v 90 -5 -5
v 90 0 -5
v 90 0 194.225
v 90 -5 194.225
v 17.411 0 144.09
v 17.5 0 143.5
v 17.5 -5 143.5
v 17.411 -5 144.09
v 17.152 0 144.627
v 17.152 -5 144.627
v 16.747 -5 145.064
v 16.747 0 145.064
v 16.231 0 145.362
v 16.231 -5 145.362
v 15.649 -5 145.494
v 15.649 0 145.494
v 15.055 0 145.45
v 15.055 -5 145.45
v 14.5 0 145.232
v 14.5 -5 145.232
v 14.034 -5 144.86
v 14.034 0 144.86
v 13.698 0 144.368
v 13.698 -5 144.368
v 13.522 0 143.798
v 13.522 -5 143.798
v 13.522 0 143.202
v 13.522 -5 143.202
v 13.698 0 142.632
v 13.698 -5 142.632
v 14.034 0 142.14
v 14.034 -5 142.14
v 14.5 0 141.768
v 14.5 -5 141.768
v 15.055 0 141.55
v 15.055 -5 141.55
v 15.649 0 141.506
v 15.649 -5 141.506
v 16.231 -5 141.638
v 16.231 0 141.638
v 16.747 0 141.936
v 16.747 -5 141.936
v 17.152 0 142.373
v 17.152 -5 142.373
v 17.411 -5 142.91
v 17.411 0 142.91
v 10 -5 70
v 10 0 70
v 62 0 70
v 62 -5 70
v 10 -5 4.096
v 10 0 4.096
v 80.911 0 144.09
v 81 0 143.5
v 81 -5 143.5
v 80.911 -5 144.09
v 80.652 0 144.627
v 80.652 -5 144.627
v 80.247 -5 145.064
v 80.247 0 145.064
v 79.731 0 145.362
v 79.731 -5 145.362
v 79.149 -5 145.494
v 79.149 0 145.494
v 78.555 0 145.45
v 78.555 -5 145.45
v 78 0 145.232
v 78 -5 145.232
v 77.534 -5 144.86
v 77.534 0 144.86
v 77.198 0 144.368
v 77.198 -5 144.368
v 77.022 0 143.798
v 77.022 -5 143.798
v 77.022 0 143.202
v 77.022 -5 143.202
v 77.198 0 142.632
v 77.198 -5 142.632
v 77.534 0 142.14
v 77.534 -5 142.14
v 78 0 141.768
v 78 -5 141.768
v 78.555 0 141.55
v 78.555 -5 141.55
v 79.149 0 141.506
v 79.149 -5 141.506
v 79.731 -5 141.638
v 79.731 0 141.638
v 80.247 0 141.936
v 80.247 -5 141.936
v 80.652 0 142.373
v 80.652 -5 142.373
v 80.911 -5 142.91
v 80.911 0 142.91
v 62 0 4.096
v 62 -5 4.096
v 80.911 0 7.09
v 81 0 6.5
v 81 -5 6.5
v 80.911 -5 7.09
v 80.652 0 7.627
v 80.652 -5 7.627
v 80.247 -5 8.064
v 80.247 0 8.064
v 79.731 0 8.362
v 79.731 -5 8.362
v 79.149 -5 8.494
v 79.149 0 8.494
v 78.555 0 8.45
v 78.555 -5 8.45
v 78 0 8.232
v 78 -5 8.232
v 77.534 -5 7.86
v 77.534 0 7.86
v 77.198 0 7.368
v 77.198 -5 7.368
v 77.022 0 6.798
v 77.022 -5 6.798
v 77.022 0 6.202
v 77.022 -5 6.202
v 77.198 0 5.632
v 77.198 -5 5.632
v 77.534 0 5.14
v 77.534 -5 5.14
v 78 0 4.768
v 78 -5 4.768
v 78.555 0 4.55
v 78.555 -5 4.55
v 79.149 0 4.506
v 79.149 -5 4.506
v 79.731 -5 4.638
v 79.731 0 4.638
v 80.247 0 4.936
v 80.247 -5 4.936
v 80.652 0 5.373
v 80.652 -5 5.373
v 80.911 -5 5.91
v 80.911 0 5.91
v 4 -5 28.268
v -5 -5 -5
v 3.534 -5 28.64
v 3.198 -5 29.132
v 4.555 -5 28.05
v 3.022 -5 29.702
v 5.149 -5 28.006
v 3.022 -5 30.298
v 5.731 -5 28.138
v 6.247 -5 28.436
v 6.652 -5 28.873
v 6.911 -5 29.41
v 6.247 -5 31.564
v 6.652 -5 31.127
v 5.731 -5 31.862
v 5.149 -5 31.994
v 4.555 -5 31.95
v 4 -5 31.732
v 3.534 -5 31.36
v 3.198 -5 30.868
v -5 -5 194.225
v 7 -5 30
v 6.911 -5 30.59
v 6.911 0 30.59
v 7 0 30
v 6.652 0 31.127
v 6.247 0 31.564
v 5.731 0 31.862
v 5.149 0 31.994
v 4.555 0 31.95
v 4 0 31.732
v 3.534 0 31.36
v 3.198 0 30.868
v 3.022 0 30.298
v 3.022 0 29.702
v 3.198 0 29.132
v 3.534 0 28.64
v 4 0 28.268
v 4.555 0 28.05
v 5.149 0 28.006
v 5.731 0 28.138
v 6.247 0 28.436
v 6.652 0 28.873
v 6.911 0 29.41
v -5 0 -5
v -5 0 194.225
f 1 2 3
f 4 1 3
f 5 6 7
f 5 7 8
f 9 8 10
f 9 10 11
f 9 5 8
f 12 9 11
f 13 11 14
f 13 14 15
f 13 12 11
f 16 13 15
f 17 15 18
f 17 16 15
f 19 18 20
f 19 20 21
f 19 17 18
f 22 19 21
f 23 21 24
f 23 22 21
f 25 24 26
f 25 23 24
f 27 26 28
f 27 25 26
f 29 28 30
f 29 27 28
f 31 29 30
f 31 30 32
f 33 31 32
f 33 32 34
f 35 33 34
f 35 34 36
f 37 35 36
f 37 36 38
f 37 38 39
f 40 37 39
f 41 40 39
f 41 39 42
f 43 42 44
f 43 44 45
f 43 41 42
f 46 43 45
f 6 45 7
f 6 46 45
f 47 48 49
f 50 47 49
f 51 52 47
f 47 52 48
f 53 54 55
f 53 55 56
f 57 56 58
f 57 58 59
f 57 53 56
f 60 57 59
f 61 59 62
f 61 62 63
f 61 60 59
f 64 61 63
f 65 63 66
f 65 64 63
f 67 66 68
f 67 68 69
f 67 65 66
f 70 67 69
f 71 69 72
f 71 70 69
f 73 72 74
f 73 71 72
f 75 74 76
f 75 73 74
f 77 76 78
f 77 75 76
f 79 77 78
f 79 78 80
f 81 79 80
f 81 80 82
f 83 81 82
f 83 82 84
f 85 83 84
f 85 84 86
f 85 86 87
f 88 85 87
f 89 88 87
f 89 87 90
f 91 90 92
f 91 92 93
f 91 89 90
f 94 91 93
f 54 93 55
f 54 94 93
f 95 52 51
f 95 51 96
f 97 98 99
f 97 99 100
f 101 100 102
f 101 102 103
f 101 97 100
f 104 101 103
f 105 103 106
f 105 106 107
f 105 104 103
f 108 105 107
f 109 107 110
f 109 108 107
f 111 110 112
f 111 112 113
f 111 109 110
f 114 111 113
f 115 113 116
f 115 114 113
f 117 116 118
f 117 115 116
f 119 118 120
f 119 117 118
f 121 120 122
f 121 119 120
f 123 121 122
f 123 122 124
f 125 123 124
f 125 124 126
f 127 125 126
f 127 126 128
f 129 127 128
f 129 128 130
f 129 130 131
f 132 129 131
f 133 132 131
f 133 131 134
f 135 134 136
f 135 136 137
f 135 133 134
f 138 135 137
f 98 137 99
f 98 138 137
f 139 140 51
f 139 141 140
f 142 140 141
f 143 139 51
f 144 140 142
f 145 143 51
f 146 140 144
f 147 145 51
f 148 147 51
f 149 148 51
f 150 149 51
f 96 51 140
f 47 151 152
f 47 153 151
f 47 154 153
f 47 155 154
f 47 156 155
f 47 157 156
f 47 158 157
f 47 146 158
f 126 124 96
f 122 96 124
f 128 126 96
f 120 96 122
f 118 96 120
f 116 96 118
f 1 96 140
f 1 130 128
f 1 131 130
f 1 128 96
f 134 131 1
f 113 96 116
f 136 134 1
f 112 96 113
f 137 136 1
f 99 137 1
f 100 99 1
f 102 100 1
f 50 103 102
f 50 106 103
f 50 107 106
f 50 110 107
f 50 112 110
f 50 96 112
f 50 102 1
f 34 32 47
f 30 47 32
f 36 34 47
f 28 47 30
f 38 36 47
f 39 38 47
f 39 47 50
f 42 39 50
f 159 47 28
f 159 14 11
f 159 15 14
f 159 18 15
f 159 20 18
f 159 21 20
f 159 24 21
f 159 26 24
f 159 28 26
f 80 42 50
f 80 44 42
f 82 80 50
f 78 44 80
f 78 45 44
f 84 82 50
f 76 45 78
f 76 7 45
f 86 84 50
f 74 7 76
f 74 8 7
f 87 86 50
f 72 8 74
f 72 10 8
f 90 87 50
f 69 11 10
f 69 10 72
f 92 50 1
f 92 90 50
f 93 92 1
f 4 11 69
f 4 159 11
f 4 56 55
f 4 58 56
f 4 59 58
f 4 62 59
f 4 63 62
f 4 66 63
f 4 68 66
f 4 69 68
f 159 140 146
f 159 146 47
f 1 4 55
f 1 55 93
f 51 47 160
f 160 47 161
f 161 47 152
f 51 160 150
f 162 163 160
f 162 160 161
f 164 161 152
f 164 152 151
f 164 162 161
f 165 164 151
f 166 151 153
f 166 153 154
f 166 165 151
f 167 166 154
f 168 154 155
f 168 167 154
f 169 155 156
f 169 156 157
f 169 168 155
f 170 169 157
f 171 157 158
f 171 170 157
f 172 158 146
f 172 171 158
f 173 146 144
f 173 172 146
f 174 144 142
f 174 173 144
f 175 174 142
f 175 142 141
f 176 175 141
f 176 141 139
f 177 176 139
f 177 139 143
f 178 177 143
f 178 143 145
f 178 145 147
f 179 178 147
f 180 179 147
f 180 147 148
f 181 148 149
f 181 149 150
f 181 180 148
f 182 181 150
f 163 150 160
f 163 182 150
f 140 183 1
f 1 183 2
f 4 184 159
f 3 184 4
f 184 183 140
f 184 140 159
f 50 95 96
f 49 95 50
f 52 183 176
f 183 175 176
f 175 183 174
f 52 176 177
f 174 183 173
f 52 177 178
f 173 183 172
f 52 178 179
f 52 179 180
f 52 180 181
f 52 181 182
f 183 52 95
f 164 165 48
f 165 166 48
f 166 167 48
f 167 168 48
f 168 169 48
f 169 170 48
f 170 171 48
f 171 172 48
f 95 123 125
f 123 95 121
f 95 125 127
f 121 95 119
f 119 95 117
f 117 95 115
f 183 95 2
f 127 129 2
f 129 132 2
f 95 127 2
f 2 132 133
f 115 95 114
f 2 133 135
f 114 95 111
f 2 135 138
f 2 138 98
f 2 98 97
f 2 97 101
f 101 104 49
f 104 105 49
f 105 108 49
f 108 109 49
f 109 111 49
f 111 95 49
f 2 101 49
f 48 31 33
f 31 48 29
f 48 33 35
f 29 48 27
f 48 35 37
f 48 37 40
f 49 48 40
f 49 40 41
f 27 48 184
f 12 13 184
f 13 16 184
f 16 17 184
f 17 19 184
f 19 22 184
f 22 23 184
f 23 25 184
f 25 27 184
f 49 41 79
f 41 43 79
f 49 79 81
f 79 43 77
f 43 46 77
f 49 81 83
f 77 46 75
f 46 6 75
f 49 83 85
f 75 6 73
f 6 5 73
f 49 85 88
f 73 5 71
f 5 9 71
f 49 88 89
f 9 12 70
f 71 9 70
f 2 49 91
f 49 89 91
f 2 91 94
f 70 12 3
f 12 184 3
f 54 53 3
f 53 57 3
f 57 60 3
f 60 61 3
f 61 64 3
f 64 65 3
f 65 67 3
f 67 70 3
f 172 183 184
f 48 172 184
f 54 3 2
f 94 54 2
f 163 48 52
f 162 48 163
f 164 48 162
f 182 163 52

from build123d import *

# Parameters (mm, degrees)
F0_W     = 95
F0_H     = 199.22458
F0_R     = 2
F0_W_2   = 52
F0_H_2   = 65.903932
F1_DEPTH = 5


with BuildPart() as f1:
    # F0 (on Front) → F1 (new body)
    with BuildSketch(Plane.XZ):
        with Locations((42.5, 94.61229)):
            Rectangle(F0_W, F0_H)
        with Locations((5, 30)):
            Circle(F0_R, mode=Mode.SUBTRACT)
        with Locations((36, 37.048034)):
            Rectangle(F0_W_2, F0_H_2, mode=Mode.SUBTRACT)
        with Locations((79, 6.5)):
            Circle(F0_R, mode=Mode.SUBTRACT)
        with Locations((15.5, 143.5)):
            Circle(F0_R, mode=Mode.SUBTRACT)
        with Locations((79, 143.5)):
            Circle(F0_R, mode=Mode.SUBTRACT)
    extrude(amount=F1_DEPTH)


solid = f1.part
